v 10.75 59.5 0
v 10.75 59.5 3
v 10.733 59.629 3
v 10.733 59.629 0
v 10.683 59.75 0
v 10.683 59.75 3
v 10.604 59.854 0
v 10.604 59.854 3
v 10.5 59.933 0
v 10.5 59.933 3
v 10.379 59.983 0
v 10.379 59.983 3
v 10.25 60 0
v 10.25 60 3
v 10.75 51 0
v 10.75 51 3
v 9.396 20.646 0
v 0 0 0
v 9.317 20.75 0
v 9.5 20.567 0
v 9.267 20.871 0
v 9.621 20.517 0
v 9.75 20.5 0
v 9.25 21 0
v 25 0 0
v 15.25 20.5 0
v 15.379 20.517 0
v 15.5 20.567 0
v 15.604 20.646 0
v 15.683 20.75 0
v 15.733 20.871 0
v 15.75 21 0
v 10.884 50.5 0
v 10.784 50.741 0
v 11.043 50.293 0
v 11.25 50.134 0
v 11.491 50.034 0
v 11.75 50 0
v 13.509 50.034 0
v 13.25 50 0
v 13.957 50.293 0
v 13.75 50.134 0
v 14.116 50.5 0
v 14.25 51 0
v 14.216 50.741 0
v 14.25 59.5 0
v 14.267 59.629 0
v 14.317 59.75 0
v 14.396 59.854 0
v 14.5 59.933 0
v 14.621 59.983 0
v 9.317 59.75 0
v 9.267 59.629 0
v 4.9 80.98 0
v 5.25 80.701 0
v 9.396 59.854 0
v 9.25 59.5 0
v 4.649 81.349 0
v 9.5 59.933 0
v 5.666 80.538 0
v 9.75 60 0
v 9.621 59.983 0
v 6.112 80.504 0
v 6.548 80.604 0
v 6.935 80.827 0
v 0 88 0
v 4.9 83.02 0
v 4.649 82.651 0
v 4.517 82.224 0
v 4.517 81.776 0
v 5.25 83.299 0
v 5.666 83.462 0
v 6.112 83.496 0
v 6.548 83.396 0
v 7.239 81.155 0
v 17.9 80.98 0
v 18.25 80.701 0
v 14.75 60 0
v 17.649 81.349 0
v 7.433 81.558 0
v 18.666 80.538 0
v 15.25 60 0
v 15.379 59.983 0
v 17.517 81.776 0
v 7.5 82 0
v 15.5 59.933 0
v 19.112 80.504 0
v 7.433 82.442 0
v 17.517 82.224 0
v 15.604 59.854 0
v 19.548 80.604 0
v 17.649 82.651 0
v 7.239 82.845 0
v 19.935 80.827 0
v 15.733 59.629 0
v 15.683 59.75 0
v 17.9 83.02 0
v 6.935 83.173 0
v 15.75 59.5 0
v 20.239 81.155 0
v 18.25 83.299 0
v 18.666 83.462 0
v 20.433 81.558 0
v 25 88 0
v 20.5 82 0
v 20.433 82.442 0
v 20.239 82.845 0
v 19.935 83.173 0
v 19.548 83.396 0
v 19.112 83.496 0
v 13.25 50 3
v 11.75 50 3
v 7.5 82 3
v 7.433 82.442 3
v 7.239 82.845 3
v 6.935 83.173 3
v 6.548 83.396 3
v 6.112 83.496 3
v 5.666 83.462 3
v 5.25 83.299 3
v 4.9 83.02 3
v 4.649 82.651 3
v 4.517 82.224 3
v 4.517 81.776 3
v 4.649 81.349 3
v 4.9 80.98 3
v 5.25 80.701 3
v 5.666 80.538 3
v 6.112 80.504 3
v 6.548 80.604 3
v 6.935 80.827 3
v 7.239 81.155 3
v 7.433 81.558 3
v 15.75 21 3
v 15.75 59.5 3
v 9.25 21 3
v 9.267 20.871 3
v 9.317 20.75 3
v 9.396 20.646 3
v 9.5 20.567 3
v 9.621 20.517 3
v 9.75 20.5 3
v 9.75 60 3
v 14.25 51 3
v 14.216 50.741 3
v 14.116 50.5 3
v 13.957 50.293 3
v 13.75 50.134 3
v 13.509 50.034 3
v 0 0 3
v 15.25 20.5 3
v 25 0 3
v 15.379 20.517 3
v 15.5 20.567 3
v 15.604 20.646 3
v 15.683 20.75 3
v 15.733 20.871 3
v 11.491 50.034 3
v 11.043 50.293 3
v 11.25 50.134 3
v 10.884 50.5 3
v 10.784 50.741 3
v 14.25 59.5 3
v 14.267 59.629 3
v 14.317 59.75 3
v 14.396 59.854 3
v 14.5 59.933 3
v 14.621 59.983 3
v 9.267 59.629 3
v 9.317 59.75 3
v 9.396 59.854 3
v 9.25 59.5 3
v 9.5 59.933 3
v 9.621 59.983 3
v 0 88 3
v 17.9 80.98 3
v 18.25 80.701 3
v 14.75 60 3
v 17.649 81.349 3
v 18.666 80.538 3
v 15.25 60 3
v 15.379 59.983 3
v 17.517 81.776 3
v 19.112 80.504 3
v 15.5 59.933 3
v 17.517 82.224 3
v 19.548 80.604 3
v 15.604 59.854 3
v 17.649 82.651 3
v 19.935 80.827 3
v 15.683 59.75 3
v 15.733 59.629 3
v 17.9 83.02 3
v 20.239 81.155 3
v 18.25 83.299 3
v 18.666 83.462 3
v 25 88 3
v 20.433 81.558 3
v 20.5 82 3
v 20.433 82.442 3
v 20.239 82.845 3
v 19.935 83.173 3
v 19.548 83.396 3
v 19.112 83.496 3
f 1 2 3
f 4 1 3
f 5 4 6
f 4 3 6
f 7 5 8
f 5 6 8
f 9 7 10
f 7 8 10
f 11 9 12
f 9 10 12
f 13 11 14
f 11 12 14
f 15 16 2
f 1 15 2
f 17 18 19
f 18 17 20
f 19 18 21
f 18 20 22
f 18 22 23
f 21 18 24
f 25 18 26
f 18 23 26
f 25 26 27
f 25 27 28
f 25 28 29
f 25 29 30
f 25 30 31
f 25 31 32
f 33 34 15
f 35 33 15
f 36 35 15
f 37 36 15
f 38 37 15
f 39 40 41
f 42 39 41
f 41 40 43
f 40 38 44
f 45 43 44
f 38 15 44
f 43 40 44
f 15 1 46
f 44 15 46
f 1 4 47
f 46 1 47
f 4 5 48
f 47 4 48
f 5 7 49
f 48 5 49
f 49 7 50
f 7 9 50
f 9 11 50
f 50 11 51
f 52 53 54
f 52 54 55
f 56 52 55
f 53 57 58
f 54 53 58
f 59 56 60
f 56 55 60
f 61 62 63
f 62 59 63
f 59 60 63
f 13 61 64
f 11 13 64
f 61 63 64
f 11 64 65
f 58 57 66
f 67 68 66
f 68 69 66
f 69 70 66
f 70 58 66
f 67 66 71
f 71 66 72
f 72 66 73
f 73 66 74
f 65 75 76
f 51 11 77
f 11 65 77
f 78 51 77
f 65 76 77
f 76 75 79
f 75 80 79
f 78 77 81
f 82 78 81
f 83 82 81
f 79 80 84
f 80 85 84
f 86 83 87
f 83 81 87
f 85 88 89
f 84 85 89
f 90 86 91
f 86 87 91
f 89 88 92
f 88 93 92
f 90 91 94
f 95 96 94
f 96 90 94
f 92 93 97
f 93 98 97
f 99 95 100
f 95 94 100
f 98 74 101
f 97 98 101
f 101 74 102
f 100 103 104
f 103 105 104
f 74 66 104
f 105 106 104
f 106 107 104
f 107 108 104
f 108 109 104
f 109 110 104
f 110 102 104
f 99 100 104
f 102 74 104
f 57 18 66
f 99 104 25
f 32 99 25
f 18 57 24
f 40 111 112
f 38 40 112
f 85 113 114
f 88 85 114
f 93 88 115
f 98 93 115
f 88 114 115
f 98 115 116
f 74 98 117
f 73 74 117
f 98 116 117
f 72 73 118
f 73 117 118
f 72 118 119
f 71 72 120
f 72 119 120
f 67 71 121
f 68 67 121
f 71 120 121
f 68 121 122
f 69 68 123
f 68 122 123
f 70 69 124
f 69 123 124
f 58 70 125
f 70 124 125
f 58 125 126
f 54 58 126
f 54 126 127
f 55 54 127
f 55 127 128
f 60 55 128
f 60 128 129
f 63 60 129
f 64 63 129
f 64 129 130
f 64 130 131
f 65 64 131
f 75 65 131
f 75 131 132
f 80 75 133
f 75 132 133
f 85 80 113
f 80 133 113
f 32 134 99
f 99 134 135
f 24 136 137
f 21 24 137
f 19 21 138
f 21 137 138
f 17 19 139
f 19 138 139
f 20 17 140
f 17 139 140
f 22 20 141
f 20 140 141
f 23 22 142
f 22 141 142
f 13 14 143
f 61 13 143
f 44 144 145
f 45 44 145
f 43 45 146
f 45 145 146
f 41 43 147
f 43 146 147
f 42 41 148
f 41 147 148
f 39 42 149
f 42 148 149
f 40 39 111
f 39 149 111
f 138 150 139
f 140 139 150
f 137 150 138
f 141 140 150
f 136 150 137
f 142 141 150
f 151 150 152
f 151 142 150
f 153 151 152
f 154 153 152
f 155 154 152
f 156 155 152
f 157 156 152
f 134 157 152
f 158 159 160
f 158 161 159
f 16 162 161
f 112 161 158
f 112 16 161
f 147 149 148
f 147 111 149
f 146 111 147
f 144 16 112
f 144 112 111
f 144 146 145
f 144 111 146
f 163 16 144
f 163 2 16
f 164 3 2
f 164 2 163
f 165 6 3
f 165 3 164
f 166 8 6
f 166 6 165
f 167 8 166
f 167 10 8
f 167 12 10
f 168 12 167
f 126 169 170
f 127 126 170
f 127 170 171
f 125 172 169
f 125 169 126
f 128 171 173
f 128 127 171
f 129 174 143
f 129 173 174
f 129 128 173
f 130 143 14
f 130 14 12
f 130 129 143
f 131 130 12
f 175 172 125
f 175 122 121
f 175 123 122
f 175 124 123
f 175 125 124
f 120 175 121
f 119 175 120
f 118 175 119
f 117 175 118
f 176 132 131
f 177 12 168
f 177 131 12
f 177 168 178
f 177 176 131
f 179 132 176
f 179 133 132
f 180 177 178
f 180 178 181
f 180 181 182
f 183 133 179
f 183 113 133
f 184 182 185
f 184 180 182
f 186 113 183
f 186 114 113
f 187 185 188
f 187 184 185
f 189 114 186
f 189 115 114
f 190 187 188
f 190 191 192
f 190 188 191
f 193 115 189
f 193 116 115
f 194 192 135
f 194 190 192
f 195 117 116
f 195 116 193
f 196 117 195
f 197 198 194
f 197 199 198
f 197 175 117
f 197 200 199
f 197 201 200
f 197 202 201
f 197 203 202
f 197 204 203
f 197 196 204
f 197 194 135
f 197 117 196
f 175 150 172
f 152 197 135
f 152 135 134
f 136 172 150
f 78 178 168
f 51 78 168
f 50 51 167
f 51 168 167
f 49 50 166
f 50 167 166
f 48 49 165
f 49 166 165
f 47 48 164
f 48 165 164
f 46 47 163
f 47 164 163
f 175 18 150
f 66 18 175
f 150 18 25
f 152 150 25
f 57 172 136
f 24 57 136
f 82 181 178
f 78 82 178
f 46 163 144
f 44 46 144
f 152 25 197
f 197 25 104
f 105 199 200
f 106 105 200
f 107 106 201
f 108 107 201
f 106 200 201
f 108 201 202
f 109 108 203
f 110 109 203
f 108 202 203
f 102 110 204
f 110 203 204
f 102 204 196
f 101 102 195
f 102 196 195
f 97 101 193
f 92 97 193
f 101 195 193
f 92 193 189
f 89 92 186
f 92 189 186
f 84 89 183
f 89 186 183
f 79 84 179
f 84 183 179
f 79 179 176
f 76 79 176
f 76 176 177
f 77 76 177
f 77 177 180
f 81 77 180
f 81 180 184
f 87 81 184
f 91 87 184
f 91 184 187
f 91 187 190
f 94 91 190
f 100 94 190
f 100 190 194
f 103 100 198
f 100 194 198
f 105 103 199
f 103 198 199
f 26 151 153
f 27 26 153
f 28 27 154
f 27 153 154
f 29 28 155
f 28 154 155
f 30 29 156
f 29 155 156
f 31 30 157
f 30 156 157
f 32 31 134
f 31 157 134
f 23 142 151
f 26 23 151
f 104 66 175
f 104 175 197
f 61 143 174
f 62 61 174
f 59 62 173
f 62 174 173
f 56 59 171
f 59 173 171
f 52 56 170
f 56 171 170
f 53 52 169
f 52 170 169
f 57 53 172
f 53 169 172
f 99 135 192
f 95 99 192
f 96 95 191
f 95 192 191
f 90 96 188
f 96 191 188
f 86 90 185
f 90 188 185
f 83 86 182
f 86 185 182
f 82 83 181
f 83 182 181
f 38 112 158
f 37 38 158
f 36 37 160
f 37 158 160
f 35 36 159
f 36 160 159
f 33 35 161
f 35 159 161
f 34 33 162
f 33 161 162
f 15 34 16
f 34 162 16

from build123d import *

# Parameters (mm, degrees)
SKETCH1_W           = 25
SKETCH1_H           = 88
BOSS_EXTRUDE1_DEPTH = 3
SKETCH2_R           = 1.5
CUT_EXTRUDE1_DEPTH  = 3
CUT_EXTRUDE2_DEPTH  = 10


with BuildPart() as part:
    # Sketch1 → Boss-Extrude1 (new body)
    with BuildSketch(Plane.XY):
        with Locations((12.5, 44)):
            Rectangle(SKETCH1_W, SKETCH1_H)
    extrude(amount=BOSS_EXTRUDE1_DEPTH)

    # Sketch2 → Cut-Extrude1 (cut)
    with BuildSketch(Plane.XY.offset(3)):
        with Locations((19, 82)):
            Circle(SKETCH2_R)
        with Locations((6, 82)):
            Circle(SKETCH2_R)
    extrude(amount=-CUT_EXTRUDE1_DEPTH, mode=Mode.SUBTRACT)

    # Sketch3 → Cut-Extrude2 (cut)
    with BuildSketch(Plane.XY.offset(3)):
        with BuildLine():
            Line((9.75, 20.5), (15.25, 20.5))
            ThreePointArc((15.25, 20.5), (15.603553391, 20.646446609), (15.75, 21))
            Line((15.75, 21), (15.75, 59.5))
            ThreePointArc((15.75, 59.5), (15.603553391, 59.853553391), (15.25, 60))
            Line((15.25, 60), (14.75, 60))
            ThreePointArc((14.75, 60), (14.396446609, 59.853553391), (14.25, 59.5))
            Line((14.25, 59.5), (14.25, 51))
            ThreePointArc((14.25, 51), (13.957106781, 50.292893219), (13.25, 50))
            Line((13.25, 50), (11.75, 50))
            ThreePointArc((11.75, 50), (11.042893219, 50.292893219), (10.75, 51))
            Line((10.75, 51), (10.75, 59.5))
            ThreePointArc((10.75, 59.5), (10.603553391, 59.853553391), (10.25, 60))
            Line((10.25, 60), (9.75, 60))
            ThreePointArc((9.75, 60), (9.396446609, 59.853553391), (9.25, 59.5))
            Line((9.25, 59.5), (9.25, 21))
            ThreePointArc((9.25, 21), (9.396446609, 20.646446609), (9.75, 20.5))
        make_face()
    extrude(amount=-CUT_EXTRUDE2_DEPTH, mode=Mode.SUBTRACT)


solid = part.part
